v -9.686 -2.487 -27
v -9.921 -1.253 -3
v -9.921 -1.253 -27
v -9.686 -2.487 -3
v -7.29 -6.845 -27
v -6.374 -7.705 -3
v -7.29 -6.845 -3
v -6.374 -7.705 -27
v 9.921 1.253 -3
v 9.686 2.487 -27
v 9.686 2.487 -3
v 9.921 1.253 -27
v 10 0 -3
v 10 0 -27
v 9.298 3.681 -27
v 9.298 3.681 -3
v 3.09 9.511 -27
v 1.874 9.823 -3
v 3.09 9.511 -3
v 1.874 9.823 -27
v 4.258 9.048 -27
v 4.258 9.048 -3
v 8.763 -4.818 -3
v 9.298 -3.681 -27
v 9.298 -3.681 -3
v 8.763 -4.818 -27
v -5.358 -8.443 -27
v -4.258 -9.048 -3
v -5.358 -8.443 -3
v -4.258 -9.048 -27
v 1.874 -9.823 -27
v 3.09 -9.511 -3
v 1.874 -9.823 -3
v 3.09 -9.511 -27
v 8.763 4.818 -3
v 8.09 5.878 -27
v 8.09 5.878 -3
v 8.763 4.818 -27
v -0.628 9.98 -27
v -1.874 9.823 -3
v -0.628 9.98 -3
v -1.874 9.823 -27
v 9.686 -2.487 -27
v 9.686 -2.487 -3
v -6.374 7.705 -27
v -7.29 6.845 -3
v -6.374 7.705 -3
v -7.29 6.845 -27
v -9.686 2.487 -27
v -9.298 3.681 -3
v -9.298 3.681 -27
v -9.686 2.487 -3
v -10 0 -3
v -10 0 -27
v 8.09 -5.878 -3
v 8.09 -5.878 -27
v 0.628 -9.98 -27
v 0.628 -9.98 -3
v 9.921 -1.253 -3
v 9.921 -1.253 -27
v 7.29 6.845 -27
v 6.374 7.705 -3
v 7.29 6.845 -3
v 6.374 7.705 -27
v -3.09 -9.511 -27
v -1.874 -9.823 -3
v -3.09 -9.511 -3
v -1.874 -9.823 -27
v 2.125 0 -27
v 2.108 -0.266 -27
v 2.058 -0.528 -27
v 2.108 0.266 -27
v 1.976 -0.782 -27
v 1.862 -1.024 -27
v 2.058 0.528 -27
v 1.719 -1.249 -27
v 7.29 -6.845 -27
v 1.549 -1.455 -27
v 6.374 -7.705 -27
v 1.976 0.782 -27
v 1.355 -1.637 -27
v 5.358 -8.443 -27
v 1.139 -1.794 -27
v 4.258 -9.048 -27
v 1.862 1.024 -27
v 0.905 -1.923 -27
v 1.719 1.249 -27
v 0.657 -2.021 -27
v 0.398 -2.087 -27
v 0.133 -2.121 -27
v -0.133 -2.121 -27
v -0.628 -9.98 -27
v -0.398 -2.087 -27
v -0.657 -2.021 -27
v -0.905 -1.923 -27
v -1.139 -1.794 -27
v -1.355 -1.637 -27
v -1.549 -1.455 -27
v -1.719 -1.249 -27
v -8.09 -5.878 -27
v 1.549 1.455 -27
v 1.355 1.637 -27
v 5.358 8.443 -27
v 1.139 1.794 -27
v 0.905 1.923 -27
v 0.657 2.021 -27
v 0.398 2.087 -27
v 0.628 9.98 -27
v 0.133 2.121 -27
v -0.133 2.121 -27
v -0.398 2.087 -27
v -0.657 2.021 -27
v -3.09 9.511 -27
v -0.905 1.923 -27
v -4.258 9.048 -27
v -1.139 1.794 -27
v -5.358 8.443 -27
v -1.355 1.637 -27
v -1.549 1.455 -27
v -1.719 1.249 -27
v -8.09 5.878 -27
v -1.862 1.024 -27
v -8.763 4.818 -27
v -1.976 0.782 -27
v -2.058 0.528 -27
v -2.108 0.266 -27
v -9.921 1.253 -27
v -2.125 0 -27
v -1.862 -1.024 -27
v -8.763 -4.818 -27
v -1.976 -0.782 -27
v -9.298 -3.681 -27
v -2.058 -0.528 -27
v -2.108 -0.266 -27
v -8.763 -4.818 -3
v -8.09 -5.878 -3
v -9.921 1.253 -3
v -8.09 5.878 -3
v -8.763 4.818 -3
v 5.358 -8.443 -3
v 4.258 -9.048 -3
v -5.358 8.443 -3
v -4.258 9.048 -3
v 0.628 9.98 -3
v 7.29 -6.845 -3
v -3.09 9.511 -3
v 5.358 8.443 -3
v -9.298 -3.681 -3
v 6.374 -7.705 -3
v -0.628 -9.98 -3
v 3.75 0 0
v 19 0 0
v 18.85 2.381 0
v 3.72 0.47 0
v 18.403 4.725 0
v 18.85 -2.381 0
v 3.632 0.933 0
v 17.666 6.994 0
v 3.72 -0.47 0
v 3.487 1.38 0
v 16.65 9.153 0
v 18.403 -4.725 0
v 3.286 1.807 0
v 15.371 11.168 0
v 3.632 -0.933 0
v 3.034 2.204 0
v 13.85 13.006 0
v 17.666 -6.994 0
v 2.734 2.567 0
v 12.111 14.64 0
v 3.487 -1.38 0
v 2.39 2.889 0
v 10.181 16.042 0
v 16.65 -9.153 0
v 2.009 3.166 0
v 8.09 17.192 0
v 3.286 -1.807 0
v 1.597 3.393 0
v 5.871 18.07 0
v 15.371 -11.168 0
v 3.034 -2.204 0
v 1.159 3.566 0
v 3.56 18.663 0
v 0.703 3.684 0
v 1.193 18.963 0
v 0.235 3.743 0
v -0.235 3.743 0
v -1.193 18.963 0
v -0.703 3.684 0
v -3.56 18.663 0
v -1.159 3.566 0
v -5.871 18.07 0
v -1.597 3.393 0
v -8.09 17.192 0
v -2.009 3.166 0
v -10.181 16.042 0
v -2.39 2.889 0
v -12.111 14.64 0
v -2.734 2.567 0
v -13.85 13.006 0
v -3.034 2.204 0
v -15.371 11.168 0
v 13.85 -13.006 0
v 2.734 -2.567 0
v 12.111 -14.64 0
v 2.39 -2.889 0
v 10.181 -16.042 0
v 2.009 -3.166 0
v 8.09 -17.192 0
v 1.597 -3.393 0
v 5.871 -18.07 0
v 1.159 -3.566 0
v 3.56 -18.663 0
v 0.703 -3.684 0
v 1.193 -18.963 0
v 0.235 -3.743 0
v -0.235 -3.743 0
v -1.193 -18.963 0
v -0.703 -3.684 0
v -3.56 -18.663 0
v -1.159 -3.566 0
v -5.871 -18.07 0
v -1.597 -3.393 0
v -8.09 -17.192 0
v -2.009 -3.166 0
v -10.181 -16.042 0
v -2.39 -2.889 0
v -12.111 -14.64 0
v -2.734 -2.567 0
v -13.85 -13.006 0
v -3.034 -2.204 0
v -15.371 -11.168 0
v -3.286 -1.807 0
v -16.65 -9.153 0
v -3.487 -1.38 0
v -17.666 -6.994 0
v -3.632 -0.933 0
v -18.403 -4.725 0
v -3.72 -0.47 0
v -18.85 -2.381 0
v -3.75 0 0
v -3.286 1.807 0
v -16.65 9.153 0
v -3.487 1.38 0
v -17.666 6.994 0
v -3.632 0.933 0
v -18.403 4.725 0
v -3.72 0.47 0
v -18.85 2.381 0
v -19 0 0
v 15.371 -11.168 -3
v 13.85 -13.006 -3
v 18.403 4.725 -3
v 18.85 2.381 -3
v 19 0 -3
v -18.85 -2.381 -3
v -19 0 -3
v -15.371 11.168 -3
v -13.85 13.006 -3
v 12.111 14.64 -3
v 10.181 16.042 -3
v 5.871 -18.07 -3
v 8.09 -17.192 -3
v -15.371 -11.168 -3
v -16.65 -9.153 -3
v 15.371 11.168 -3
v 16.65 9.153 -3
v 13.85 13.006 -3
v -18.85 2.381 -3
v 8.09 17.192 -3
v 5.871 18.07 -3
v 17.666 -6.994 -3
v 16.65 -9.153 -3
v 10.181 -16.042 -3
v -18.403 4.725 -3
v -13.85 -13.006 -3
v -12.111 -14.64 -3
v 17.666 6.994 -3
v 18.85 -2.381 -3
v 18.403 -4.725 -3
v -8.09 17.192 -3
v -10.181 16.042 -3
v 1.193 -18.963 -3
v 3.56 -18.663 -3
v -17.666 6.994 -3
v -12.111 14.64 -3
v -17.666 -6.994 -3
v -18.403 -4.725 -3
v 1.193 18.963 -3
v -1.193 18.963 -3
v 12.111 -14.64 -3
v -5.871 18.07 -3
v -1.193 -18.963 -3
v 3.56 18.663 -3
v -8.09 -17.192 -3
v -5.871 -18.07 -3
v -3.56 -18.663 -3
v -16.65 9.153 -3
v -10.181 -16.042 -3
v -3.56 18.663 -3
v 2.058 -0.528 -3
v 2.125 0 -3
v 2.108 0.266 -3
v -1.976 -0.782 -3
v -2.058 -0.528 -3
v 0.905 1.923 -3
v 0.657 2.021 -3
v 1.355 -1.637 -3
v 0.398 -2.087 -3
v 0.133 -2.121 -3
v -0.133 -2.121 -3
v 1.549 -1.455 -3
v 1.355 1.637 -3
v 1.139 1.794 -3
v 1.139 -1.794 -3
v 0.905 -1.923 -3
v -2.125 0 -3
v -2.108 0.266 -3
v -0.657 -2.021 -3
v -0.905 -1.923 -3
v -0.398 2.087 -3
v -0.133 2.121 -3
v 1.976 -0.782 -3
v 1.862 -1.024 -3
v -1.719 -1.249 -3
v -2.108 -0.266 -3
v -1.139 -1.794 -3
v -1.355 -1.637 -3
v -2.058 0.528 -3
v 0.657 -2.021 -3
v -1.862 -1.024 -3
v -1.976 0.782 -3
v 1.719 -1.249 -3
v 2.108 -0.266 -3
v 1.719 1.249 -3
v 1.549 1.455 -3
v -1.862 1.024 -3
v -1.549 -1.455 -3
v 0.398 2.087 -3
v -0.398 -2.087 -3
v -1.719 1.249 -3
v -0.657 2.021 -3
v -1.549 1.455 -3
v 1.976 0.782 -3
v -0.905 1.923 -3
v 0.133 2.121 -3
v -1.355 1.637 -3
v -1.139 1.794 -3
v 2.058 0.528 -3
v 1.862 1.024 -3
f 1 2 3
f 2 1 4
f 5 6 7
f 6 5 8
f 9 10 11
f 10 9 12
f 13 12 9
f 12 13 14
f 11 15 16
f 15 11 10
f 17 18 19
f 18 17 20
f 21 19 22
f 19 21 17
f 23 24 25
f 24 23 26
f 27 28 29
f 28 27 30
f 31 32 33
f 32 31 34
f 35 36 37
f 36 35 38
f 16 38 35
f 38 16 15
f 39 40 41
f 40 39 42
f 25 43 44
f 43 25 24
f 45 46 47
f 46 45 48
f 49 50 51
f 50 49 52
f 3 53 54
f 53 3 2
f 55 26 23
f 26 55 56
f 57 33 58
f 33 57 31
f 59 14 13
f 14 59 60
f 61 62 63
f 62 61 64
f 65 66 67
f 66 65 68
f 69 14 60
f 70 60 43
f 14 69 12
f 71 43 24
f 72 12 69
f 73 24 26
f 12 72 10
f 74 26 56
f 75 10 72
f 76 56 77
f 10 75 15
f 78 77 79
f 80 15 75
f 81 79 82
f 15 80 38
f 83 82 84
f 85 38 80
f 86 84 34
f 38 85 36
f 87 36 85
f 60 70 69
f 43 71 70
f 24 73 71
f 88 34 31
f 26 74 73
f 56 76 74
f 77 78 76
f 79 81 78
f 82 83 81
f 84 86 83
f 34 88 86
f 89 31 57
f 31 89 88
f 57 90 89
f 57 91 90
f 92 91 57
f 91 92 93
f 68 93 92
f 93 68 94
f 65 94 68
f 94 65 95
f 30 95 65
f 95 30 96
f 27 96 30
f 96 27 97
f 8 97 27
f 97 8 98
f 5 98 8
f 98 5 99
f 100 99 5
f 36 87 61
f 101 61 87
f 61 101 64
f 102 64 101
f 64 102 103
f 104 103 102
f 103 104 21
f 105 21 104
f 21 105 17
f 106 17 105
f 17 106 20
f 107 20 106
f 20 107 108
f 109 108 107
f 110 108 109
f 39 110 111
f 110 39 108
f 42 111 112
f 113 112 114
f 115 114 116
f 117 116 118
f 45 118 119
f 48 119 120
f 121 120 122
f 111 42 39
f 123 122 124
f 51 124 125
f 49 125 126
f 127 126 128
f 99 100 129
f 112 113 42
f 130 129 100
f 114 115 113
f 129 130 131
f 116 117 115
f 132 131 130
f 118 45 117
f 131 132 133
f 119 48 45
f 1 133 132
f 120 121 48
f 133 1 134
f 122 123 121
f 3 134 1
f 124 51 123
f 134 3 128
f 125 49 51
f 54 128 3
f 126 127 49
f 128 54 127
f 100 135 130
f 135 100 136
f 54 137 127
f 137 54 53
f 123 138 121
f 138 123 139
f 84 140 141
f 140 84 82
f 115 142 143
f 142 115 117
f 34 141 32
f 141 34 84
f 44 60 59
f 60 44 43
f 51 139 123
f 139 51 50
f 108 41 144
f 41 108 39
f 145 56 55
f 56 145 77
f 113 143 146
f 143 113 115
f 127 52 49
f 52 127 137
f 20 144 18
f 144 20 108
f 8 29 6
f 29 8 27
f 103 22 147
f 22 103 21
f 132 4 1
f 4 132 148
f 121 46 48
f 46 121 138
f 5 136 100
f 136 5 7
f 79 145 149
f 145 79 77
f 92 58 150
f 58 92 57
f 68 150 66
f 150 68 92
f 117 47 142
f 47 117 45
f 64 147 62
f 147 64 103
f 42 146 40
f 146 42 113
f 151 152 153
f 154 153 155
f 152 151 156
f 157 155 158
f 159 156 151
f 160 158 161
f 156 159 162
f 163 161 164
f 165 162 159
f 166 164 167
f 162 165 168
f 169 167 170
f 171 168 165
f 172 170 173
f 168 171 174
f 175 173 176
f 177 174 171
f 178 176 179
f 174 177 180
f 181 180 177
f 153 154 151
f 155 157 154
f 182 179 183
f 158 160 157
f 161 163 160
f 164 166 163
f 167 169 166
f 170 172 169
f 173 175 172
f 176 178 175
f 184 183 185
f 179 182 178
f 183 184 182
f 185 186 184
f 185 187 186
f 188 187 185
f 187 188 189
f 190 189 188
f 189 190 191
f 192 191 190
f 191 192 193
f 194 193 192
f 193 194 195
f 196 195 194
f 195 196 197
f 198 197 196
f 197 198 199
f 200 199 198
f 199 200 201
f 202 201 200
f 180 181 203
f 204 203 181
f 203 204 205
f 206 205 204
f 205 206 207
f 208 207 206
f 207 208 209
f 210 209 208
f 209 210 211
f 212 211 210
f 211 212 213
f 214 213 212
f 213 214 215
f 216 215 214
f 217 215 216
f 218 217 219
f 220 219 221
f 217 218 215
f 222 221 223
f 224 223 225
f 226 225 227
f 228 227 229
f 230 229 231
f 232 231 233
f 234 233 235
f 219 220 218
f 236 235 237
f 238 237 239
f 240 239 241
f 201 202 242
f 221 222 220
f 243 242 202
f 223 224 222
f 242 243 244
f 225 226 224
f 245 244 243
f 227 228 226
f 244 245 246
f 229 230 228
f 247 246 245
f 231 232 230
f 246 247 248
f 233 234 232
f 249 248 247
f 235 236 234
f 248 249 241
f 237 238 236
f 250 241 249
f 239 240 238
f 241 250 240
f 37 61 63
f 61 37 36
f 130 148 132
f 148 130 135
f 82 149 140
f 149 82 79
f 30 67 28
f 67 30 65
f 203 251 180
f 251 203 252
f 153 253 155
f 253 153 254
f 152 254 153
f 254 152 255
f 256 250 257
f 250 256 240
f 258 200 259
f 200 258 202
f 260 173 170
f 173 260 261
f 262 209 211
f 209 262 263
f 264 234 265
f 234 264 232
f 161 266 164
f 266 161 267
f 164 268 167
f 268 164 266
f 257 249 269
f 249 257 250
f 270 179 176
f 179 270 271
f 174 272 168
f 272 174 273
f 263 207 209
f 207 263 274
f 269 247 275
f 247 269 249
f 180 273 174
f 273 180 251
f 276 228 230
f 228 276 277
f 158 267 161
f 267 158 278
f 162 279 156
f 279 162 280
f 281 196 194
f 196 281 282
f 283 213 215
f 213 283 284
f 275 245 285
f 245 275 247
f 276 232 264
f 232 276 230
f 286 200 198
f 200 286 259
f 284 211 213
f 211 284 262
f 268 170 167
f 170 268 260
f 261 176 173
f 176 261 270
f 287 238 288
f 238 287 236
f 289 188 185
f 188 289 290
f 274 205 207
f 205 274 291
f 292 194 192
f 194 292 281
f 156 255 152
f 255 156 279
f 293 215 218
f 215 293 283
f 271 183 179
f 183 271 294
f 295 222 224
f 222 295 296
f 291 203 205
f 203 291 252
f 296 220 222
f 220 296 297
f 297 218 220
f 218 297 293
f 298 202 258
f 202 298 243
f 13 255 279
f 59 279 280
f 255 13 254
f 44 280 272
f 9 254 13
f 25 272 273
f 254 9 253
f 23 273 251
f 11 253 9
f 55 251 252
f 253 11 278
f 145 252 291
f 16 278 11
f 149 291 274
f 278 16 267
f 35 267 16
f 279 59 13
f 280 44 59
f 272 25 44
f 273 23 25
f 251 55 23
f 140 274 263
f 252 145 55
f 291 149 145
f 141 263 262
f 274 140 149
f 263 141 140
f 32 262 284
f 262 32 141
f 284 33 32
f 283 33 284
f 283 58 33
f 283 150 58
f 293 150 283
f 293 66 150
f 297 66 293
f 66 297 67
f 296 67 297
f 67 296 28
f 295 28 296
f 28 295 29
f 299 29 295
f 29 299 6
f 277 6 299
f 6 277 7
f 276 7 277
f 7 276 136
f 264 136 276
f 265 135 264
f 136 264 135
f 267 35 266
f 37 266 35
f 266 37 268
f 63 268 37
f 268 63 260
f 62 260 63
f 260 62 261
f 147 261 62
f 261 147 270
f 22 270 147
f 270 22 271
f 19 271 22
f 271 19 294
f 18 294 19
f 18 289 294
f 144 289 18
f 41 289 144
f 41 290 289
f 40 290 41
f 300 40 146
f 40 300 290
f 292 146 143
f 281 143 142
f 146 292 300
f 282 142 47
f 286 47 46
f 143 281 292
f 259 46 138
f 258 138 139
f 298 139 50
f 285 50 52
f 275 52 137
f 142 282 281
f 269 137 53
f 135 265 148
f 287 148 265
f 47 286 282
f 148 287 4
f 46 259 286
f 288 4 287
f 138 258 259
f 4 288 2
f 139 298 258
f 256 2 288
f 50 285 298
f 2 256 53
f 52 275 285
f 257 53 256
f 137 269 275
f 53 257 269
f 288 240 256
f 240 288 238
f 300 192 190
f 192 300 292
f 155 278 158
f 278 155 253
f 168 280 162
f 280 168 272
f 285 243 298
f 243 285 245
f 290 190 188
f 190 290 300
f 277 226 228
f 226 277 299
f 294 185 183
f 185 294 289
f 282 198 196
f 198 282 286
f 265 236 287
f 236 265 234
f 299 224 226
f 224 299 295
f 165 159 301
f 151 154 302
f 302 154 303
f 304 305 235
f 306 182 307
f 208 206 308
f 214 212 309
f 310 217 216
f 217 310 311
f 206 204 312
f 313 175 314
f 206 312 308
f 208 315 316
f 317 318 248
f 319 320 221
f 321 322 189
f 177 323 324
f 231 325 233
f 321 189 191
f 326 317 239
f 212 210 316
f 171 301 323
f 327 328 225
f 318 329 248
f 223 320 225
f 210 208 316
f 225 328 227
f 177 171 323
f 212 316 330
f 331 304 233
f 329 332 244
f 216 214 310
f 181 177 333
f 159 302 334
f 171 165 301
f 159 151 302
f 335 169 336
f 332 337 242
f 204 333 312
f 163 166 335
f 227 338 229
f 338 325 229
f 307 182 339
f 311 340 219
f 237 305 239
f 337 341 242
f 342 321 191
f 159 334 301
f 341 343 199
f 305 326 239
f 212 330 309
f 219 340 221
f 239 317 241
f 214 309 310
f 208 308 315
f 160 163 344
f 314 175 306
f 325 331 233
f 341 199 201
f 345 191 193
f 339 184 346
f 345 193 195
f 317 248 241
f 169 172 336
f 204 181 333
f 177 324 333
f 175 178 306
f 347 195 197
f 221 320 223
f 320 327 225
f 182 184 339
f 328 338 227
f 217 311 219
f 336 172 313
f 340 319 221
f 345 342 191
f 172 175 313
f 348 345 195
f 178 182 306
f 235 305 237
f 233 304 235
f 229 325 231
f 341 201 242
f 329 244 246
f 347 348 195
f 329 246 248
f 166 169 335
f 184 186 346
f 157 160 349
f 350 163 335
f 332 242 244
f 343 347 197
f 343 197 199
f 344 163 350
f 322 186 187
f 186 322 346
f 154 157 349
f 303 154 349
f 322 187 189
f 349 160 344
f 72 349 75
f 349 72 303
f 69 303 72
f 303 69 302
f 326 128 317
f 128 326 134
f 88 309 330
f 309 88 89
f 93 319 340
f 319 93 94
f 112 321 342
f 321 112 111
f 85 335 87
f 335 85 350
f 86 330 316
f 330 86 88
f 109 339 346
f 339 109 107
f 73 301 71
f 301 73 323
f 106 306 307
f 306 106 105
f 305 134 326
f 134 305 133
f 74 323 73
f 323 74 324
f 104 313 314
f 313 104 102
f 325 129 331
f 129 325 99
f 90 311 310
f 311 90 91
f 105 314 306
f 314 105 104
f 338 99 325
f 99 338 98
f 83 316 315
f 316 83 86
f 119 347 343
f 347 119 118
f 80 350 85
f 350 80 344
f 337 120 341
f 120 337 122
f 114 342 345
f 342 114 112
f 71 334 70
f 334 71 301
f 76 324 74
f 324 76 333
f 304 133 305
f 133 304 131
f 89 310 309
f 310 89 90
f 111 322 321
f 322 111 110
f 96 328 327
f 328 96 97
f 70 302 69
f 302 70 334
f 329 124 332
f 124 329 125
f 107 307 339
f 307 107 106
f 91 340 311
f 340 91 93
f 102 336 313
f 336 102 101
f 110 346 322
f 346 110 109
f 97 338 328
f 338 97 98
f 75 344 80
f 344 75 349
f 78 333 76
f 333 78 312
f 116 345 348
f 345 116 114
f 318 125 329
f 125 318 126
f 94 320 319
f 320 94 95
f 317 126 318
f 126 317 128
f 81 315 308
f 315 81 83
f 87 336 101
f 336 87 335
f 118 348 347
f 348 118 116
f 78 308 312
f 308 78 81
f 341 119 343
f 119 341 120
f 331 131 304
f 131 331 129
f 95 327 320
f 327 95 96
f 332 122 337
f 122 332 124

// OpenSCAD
$fn = 50;


difference() {
	union() {
		translate(v = [0, 0, -27.0000000000]) {
			cylinder(h = 27, r = 10.0000000000);
		}
		translate(v = [0, 0, -3.0000000000]) {
			cylinder(h = 3, r = 19.0000000000);
		}
	}
	union() {
		translate(v = [0, 0, 0]) {
			rotate(a = [0, 0, 0]) {
				difference() {
					union() {
						#translate(v = [0, 0, -27.0000000000]) {
							cylinder(h = 27, r = 2.0000000000);
						}
						#translate(v = [0, 0, -3]) {
							cylinder(h = 3, r = 10.0000000000, r1 = 2.1250000000, r2 = 3.7500000000);
						}
						#translate(v = [0, 0, -27.0000000000]) {
							cylinder(h = 27, r = 2.1250000000);
						}
						#translate(v = [0, 0, -27.0000000000]) {
							cylinder(h = 27, r = 2.0000000000);
						}
					}
					union();
				}
			}
		}
	}
}
